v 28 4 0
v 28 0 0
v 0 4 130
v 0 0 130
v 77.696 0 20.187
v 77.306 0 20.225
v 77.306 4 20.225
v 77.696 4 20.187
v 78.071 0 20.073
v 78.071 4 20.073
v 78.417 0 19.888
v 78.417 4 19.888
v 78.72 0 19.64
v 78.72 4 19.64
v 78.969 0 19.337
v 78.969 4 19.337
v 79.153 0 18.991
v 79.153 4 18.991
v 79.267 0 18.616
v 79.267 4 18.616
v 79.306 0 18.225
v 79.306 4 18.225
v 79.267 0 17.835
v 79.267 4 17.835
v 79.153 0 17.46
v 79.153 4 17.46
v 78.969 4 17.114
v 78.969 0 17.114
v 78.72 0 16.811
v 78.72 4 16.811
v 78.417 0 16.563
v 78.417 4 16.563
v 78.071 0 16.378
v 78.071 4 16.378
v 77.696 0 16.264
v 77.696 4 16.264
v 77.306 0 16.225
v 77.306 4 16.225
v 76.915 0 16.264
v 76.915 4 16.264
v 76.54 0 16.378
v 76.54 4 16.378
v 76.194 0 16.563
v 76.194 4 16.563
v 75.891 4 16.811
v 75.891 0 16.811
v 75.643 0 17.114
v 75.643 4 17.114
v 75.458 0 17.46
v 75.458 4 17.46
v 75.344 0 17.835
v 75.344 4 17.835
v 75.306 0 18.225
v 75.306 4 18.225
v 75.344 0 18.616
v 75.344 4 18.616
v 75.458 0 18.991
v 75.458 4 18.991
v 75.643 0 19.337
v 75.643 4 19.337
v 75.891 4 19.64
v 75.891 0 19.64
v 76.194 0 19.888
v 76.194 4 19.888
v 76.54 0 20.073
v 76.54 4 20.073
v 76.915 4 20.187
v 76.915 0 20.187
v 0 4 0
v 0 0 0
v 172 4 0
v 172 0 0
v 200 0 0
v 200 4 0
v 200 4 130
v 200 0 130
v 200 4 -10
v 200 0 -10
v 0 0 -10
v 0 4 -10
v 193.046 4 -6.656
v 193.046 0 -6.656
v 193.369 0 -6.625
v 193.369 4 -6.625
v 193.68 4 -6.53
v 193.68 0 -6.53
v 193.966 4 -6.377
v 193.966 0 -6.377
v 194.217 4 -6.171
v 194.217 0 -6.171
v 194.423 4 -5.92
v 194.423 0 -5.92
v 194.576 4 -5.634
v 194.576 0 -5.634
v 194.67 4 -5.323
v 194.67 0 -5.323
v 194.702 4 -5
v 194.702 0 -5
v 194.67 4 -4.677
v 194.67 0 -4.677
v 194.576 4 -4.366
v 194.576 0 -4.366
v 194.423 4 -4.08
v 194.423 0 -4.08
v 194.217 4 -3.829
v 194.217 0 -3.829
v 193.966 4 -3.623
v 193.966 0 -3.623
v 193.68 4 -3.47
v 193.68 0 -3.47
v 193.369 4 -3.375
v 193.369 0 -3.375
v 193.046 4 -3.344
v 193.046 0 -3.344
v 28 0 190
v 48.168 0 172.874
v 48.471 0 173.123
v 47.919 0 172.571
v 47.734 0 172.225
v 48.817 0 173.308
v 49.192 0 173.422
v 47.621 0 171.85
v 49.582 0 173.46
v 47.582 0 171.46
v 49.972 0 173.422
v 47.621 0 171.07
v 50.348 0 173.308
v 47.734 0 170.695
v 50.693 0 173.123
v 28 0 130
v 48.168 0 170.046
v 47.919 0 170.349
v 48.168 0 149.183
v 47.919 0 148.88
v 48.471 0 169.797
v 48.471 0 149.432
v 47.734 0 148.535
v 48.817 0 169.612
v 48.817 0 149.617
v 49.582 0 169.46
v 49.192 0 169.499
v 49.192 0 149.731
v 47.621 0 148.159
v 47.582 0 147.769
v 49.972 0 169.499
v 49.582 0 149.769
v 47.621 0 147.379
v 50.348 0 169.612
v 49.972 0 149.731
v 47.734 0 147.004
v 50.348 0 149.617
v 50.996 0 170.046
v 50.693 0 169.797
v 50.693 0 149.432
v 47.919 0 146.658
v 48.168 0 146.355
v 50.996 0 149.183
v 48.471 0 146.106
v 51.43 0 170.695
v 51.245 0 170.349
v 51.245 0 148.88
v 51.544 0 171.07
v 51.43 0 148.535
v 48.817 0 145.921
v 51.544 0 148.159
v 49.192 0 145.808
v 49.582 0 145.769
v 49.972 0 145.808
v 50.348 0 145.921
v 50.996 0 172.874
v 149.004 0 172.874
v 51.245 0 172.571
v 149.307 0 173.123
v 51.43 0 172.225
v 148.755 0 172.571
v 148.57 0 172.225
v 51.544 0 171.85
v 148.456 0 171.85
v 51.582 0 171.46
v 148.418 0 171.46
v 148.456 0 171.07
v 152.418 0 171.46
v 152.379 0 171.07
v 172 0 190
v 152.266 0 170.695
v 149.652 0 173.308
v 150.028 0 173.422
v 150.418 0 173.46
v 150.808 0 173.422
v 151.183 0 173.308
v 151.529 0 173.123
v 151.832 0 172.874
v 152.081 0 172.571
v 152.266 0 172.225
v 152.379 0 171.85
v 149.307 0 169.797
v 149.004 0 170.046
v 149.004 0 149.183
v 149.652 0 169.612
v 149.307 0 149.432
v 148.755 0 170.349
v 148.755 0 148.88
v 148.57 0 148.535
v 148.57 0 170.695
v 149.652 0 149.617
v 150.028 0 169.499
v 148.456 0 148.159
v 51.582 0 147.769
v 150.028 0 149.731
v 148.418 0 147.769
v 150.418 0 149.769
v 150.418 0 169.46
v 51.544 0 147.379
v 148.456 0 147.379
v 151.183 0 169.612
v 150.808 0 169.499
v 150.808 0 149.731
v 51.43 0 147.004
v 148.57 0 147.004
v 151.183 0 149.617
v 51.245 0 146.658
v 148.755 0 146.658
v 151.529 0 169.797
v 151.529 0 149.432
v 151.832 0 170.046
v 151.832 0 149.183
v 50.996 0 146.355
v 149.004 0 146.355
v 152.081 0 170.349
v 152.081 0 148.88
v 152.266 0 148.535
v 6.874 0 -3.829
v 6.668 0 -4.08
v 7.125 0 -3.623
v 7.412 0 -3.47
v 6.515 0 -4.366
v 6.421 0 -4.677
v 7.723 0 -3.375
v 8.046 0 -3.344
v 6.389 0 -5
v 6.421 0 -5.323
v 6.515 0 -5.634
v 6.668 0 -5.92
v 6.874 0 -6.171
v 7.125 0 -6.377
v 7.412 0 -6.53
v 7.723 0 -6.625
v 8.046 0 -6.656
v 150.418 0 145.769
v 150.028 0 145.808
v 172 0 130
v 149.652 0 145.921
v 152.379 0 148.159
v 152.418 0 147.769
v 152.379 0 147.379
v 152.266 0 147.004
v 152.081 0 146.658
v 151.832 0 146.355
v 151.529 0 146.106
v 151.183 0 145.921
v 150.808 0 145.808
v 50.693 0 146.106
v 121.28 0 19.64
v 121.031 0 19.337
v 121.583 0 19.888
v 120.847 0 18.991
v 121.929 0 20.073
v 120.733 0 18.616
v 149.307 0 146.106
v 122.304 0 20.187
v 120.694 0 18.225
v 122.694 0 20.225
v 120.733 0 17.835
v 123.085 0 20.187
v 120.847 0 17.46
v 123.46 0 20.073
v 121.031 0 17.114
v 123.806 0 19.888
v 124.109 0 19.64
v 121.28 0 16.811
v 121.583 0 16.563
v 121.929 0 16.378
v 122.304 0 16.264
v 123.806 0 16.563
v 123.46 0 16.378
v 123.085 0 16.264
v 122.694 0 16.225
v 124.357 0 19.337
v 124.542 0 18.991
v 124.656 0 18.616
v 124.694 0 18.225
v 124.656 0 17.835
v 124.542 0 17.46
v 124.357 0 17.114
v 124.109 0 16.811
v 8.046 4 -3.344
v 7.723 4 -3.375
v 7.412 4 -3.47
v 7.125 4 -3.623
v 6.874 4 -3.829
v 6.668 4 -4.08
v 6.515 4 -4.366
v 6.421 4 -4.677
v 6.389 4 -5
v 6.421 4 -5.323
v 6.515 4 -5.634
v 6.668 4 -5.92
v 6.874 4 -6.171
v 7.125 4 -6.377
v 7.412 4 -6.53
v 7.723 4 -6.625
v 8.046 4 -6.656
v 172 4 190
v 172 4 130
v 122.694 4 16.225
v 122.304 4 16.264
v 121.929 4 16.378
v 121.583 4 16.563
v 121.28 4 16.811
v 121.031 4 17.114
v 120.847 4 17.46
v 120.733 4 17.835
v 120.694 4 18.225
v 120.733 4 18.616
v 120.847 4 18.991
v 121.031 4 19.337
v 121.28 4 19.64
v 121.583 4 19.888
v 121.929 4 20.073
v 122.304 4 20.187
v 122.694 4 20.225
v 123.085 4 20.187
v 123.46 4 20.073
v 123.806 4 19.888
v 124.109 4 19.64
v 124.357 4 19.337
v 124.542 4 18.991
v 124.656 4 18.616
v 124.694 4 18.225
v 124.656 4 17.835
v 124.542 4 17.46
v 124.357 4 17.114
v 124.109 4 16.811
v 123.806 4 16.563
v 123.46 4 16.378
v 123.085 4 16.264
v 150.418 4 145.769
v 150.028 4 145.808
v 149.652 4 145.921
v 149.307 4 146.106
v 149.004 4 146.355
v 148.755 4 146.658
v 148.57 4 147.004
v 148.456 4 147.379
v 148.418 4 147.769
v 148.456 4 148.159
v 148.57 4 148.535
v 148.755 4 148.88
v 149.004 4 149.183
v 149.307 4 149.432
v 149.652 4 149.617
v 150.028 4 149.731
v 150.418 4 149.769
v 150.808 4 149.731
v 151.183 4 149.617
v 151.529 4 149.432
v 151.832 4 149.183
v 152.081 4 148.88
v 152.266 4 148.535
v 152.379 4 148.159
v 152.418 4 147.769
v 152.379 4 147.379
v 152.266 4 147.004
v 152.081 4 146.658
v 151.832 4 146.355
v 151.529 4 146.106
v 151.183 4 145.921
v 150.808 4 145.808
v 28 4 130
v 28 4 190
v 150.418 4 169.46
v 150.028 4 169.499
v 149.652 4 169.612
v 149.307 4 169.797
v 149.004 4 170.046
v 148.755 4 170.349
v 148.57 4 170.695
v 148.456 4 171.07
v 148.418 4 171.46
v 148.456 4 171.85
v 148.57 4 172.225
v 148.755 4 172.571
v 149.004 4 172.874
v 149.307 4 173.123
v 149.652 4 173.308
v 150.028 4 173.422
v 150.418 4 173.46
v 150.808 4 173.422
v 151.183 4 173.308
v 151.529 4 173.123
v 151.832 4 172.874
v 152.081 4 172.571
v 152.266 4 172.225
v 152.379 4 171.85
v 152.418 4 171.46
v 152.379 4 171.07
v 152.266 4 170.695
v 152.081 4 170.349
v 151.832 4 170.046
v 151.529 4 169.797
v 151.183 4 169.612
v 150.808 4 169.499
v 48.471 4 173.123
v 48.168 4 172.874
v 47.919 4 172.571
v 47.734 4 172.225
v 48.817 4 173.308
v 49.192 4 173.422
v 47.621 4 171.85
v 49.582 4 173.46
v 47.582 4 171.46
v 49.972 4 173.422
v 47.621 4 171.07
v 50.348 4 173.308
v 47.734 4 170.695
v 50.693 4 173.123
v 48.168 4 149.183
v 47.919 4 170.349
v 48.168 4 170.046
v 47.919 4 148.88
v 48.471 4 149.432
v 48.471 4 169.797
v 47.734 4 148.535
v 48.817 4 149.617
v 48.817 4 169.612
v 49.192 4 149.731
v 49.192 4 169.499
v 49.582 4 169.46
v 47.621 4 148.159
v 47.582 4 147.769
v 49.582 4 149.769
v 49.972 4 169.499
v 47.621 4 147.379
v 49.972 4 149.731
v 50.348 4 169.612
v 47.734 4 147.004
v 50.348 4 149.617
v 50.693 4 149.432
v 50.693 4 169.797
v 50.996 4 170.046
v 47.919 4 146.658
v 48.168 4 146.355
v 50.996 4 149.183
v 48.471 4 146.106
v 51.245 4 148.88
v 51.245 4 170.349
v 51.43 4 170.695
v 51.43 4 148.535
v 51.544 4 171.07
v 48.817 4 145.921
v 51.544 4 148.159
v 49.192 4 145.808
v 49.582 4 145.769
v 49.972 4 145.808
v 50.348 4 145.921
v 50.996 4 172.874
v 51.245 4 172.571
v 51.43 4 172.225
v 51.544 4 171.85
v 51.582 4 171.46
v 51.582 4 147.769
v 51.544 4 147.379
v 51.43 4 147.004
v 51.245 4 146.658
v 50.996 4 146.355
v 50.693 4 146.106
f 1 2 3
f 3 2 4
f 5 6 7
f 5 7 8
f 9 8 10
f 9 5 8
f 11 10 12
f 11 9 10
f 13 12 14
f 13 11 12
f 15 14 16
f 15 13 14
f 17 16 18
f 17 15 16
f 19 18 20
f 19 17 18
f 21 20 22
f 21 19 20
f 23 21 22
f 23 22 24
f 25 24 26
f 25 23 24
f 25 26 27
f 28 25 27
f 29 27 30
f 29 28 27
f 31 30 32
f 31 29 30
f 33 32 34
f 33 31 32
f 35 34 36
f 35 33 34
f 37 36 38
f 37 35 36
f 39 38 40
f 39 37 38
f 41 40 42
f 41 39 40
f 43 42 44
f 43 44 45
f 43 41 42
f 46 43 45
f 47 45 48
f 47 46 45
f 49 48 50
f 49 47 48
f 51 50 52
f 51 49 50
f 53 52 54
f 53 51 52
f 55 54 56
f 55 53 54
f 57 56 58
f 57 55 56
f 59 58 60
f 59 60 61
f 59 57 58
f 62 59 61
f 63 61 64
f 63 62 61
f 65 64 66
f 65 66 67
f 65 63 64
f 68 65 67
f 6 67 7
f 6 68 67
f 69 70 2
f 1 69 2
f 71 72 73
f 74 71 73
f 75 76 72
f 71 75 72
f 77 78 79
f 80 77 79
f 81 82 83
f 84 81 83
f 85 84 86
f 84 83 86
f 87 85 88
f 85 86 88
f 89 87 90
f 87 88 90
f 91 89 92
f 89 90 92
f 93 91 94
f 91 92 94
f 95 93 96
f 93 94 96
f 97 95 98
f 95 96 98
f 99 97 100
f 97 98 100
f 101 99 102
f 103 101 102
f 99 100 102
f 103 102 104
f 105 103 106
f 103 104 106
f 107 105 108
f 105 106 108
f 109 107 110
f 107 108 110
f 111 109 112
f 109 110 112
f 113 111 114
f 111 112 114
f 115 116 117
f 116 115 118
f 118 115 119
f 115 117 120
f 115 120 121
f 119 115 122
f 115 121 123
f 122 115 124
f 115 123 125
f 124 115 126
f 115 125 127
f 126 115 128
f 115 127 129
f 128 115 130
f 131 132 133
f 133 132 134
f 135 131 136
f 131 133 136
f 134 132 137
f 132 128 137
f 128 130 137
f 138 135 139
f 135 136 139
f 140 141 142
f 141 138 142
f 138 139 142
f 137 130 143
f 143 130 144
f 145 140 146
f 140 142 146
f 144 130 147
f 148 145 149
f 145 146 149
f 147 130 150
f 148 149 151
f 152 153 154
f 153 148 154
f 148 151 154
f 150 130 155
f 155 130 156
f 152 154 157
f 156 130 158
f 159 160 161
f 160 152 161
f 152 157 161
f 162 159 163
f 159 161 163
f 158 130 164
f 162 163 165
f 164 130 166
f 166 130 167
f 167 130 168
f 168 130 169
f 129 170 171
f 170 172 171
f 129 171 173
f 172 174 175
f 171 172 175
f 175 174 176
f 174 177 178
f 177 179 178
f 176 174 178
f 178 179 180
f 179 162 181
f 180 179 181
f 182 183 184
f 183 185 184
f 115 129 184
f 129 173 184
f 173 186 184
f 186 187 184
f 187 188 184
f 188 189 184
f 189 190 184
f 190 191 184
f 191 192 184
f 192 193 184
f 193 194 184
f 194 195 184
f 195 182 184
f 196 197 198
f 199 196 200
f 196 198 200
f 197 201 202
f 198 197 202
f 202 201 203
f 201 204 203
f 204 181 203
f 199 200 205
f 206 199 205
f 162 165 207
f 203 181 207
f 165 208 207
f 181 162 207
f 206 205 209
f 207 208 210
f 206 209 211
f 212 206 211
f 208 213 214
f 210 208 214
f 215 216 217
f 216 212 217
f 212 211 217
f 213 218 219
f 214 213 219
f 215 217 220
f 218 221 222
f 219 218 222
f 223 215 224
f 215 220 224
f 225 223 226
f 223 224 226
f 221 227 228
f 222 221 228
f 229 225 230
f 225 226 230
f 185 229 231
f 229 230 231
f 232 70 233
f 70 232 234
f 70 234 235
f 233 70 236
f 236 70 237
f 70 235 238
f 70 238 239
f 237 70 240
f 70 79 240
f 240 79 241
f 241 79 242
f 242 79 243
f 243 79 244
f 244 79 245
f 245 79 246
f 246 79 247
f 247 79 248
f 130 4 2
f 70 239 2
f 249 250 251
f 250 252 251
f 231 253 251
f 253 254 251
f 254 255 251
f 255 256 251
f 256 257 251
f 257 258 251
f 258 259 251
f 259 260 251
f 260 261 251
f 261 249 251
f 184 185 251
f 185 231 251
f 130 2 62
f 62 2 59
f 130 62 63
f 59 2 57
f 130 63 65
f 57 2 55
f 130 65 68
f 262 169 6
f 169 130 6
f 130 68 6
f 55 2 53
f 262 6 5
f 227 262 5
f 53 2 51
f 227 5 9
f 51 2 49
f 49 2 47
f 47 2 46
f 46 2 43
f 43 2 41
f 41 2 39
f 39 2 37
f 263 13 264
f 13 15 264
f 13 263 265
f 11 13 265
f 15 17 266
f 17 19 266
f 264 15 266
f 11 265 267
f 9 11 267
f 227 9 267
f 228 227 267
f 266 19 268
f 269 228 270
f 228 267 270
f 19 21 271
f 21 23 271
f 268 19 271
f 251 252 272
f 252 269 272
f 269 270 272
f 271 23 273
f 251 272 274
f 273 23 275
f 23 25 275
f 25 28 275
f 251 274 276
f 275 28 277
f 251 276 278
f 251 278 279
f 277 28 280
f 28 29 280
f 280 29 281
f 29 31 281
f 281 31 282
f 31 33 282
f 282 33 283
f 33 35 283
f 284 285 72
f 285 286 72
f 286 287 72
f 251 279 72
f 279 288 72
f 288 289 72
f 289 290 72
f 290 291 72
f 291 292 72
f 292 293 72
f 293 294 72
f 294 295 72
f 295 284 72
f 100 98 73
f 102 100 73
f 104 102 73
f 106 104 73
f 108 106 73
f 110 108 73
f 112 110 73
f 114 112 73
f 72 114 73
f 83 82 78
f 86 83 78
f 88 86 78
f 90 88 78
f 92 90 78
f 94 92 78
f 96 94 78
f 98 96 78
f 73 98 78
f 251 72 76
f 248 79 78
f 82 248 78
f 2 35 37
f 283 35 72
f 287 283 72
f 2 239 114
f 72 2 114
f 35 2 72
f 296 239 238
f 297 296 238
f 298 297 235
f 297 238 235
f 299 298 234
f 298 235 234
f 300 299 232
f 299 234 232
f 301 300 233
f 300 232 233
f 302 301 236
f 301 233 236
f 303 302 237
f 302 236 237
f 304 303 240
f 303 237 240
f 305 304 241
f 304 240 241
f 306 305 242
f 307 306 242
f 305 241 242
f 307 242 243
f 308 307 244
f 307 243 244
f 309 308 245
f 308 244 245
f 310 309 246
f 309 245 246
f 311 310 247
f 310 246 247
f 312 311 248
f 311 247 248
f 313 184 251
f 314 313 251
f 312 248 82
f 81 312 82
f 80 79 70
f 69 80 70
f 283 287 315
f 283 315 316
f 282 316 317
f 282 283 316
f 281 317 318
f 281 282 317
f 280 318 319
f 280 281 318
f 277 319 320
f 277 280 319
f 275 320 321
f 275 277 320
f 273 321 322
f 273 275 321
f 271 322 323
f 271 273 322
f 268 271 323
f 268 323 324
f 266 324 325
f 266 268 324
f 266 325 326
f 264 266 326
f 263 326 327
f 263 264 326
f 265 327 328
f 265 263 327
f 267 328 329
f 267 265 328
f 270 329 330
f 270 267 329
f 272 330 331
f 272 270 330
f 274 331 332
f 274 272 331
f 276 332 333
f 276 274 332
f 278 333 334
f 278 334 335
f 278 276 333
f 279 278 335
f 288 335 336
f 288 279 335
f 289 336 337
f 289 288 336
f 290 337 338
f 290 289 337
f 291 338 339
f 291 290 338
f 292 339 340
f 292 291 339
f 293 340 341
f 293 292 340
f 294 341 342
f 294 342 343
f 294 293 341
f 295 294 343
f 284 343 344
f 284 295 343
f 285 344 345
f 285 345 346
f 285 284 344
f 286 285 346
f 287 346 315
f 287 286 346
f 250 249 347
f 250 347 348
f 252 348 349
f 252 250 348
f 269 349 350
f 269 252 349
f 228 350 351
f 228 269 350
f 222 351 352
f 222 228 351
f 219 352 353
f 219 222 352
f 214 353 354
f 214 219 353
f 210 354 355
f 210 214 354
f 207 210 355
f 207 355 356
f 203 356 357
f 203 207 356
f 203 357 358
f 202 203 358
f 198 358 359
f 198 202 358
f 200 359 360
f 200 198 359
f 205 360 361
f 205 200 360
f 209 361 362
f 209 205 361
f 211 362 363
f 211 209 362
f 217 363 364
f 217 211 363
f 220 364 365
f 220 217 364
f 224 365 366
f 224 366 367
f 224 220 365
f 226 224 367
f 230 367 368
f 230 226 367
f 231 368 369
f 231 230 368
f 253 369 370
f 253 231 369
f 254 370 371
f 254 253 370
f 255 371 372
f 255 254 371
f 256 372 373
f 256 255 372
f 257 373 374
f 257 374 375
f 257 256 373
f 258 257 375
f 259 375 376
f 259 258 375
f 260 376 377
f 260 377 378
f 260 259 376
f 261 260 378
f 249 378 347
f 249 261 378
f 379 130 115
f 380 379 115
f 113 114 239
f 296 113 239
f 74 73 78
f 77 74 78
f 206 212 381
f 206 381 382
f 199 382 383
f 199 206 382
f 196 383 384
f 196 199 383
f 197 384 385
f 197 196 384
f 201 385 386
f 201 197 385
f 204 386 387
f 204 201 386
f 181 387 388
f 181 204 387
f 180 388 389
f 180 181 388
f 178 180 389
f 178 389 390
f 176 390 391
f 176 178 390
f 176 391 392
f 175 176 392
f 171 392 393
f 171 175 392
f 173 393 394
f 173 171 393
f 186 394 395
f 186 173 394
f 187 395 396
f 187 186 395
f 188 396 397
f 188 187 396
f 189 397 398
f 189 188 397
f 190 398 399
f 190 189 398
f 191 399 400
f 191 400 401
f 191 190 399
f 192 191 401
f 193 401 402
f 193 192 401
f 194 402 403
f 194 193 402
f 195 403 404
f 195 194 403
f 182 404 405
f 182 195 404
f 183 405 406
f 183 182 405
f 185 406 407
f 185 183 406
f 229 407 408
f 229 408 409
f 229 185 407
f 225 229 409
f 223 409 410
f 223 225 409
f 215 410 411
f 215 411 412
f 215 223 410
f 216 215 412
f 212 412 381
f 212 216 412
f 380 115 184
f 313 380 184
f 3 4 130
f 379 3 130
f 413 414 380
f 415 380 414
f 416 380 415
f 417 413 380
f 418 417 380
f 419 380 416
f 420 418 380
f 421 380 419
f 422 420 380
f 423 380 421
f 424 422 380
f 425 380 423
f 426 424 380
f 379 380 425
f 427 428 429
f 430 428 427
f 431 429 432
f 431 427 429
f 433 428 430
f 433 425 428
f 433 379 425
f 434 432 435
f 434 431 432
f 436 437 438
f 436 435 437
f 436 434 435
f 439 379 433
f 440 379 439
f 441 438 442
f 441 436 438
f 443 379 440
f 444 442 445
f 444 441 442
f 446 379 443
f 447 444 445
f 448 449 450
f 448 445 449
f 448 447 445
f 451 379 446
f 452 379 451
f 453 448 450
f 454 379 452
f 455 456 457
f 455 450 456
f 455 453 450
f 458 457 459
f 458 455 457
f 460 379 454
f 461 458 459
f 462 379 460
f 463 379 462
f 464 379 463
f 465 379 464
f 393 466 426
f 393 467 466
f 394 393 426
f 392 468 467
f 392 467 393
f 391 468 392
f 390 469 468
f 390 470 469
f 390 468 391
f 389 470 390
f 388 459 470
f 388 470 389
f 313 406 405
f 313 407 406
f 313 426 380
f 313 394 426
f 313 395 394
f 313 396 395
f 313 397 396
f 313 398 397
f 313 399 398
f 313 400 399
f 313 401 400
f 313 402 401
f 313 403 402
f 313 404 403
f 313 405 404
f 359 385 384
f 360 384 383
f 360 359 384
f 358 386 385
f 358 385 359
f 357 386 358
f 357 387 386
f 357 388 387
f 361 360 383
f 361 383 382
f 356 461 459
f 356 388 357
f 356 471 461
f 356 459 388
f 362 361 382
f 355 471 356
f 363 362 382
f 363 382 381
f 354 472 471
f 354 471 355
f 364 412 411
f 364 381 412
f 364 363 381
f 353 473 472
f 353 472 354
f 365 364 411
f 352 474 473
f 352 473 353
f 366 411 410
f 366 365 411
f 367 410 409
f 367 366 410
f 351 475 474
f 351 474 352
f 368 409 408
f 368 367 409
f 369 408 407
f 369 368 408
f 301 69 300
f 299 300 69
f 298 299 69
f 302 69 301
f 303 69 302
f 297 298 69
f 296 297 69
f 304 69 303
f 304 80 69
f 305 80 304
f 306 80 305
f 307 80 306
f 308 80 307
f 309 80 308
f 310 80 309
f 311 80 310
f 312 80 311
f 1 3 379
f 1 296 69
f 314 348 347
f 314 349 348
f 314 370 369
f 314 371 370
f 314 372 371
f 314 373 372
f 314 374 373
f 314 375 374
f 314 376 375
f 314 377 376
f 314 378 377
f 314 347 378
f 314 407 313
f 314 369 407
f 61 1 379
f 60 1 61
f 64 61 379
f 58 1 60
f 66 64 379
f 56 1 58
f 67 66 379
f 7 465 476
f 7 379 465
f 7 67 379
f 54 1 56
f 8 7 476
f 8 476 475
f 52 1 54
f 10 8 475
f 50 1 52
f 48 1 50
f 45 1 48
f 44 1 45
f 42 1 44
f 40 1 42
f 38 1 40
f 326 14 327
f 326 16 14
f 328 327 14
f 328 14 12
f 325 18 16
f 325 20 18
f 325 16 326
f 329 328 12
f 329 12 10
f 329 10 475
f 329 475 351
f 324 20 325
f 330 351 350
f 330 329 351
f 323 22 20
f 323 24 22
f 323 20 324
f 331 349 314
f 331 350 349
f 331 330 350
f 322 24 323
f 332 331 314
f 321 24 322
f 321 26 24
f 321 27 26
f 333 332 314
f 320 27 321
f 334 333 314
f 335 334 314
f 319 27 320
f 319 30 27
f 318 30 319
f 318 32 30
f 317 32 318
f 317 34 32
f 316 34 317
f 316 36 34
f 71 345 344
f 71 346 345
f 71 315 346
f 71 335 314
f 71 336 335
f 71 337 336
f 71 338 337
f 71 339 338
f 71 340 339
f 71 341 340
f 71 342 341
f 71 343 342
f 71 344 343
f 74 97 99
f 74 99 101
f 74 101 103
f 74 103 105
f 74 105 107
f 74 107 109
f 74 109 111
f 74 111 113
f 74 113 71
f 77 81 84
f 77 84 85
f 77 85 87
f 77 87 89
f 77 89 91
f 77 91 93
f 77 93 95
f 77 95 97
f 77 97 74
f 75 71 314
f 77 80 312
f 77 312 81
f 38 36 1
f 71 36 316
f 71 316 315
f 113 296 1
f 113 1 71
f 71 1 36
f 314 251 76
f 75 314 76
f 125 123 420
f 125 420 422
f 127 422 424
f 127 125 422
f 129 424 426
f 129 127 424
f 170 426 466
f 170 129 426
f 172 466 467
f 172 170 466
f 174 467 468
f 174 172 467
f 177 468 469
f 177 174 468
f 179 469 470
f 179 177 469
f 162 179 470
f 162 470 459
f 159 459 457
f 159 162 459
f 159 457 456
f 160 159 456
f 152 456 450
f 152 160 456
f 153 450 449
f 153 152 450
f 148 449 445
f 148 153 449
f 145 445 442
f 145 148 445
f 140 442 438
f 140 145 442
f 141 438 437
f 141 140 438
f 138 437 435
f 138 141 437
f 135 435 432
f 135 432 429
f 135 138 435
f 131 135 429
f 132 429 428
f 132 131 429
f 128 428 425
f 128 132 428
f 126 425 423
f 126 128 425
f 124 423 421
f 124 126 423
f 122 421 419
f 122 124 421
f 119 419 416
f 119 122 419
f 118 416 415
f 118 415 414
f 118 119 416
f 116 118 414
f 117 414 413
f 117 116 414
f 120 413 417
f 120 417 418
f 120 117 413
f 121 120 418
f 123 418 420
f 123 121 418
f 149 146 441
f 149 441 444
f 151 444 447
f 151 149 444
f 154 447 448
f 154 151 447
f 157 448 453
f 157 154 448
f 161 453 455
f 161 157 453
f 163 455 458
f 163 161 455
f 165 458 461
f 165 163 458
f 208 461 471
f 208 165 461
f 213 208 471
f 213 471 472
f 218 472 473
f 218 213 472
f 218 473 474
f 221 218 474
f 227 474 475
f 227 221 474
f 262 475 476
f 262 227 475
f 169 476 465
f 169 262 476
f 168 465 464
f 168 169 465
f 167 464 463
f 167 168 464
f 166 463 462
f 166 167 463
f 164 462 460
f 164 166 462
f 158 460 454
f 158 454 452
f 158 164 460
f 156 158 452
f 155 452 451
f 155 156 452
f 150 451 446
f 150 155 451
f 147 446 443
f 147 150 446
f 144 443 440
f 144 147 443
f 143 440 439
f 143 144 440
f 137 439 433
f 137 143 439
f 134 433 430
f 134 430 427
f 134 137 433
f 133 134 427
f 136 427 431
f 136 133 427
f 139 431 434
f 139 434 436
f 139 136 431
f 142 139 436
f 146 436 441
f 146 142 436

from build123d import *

# Parameters (mm, degrees)
ESQUISSE1_R        = 2
BOSS_EXTRU_1_DEPTH = 4


with BuildPart() as part:
    # Esquisse1 → Boss.-Extru.1 (new body)
    with BuildSketch(Plane(origin=(0, 0, 0), x_dir=(1, 0, 0), z_dir=(0, 1, 0))):
        Polygon((0, 0), (28, 0), (0, -130), (28, -130), (28, -190), (172, -190), (172, -130), (200, -130), (172, 0), (200, 0), (200, 10), (0, 10), align=None)
        with Locations(Location((49.582205252, -147.769246608, 0), (0, 0, 270))):
            Circle(ESQUISSE1_R, mode=Mode.SUBTRACT)
        with Locations(Location((49.582205252, -171.460126827, 0), (0, 0, 270))):
            Circle(ESQUISSE1_R, mode=Mode.SUBTRACT)
        with Locations(Location((77.305575721, -18.22549733, 0), (0, 0, 270))):
            Circle(ESQUISSE1_R, mode=Mode.SUBTRACT)
        with Locations(Location((150.417794748, -171.460126827, 0), (0, 0, 90))):
            Circle(ESQUISSE1_R, mode=Mode.SUBTRACT)
        with Locations(Location((150.417794748, -147.769246608, 0), (0, 0, 90))):
            Circle(ESQUISSE1_R, mode=Mode.SUBTRACT)
        with Locations(Location((122.694424279, -18.22549733, 0), (0, 0, 90))):
            Circle(ESQUISSE1_R, mode=Mode.SUBTRACT)
        with BuildLine():
            Line((8.045765112, 6.656458485), (193.045765112, 6.656458485))
            ThreePointArc((193.045765112, 6.656458485), (194.702223597, 5), (193.045765112, 3.343541515))
            Line((193.045765112, 3.343541515), (8.045765112, 3.343541515))
            ThreePointArc((8.045765112, 3.343541515), (6.389306627, 5), (8.045765112, 6.656458485))
        make_face(mode=Mode.SUBTRACT)
    extrude(amount=BOSS_EXTRU_1_DEPTH)


solid = part.part
